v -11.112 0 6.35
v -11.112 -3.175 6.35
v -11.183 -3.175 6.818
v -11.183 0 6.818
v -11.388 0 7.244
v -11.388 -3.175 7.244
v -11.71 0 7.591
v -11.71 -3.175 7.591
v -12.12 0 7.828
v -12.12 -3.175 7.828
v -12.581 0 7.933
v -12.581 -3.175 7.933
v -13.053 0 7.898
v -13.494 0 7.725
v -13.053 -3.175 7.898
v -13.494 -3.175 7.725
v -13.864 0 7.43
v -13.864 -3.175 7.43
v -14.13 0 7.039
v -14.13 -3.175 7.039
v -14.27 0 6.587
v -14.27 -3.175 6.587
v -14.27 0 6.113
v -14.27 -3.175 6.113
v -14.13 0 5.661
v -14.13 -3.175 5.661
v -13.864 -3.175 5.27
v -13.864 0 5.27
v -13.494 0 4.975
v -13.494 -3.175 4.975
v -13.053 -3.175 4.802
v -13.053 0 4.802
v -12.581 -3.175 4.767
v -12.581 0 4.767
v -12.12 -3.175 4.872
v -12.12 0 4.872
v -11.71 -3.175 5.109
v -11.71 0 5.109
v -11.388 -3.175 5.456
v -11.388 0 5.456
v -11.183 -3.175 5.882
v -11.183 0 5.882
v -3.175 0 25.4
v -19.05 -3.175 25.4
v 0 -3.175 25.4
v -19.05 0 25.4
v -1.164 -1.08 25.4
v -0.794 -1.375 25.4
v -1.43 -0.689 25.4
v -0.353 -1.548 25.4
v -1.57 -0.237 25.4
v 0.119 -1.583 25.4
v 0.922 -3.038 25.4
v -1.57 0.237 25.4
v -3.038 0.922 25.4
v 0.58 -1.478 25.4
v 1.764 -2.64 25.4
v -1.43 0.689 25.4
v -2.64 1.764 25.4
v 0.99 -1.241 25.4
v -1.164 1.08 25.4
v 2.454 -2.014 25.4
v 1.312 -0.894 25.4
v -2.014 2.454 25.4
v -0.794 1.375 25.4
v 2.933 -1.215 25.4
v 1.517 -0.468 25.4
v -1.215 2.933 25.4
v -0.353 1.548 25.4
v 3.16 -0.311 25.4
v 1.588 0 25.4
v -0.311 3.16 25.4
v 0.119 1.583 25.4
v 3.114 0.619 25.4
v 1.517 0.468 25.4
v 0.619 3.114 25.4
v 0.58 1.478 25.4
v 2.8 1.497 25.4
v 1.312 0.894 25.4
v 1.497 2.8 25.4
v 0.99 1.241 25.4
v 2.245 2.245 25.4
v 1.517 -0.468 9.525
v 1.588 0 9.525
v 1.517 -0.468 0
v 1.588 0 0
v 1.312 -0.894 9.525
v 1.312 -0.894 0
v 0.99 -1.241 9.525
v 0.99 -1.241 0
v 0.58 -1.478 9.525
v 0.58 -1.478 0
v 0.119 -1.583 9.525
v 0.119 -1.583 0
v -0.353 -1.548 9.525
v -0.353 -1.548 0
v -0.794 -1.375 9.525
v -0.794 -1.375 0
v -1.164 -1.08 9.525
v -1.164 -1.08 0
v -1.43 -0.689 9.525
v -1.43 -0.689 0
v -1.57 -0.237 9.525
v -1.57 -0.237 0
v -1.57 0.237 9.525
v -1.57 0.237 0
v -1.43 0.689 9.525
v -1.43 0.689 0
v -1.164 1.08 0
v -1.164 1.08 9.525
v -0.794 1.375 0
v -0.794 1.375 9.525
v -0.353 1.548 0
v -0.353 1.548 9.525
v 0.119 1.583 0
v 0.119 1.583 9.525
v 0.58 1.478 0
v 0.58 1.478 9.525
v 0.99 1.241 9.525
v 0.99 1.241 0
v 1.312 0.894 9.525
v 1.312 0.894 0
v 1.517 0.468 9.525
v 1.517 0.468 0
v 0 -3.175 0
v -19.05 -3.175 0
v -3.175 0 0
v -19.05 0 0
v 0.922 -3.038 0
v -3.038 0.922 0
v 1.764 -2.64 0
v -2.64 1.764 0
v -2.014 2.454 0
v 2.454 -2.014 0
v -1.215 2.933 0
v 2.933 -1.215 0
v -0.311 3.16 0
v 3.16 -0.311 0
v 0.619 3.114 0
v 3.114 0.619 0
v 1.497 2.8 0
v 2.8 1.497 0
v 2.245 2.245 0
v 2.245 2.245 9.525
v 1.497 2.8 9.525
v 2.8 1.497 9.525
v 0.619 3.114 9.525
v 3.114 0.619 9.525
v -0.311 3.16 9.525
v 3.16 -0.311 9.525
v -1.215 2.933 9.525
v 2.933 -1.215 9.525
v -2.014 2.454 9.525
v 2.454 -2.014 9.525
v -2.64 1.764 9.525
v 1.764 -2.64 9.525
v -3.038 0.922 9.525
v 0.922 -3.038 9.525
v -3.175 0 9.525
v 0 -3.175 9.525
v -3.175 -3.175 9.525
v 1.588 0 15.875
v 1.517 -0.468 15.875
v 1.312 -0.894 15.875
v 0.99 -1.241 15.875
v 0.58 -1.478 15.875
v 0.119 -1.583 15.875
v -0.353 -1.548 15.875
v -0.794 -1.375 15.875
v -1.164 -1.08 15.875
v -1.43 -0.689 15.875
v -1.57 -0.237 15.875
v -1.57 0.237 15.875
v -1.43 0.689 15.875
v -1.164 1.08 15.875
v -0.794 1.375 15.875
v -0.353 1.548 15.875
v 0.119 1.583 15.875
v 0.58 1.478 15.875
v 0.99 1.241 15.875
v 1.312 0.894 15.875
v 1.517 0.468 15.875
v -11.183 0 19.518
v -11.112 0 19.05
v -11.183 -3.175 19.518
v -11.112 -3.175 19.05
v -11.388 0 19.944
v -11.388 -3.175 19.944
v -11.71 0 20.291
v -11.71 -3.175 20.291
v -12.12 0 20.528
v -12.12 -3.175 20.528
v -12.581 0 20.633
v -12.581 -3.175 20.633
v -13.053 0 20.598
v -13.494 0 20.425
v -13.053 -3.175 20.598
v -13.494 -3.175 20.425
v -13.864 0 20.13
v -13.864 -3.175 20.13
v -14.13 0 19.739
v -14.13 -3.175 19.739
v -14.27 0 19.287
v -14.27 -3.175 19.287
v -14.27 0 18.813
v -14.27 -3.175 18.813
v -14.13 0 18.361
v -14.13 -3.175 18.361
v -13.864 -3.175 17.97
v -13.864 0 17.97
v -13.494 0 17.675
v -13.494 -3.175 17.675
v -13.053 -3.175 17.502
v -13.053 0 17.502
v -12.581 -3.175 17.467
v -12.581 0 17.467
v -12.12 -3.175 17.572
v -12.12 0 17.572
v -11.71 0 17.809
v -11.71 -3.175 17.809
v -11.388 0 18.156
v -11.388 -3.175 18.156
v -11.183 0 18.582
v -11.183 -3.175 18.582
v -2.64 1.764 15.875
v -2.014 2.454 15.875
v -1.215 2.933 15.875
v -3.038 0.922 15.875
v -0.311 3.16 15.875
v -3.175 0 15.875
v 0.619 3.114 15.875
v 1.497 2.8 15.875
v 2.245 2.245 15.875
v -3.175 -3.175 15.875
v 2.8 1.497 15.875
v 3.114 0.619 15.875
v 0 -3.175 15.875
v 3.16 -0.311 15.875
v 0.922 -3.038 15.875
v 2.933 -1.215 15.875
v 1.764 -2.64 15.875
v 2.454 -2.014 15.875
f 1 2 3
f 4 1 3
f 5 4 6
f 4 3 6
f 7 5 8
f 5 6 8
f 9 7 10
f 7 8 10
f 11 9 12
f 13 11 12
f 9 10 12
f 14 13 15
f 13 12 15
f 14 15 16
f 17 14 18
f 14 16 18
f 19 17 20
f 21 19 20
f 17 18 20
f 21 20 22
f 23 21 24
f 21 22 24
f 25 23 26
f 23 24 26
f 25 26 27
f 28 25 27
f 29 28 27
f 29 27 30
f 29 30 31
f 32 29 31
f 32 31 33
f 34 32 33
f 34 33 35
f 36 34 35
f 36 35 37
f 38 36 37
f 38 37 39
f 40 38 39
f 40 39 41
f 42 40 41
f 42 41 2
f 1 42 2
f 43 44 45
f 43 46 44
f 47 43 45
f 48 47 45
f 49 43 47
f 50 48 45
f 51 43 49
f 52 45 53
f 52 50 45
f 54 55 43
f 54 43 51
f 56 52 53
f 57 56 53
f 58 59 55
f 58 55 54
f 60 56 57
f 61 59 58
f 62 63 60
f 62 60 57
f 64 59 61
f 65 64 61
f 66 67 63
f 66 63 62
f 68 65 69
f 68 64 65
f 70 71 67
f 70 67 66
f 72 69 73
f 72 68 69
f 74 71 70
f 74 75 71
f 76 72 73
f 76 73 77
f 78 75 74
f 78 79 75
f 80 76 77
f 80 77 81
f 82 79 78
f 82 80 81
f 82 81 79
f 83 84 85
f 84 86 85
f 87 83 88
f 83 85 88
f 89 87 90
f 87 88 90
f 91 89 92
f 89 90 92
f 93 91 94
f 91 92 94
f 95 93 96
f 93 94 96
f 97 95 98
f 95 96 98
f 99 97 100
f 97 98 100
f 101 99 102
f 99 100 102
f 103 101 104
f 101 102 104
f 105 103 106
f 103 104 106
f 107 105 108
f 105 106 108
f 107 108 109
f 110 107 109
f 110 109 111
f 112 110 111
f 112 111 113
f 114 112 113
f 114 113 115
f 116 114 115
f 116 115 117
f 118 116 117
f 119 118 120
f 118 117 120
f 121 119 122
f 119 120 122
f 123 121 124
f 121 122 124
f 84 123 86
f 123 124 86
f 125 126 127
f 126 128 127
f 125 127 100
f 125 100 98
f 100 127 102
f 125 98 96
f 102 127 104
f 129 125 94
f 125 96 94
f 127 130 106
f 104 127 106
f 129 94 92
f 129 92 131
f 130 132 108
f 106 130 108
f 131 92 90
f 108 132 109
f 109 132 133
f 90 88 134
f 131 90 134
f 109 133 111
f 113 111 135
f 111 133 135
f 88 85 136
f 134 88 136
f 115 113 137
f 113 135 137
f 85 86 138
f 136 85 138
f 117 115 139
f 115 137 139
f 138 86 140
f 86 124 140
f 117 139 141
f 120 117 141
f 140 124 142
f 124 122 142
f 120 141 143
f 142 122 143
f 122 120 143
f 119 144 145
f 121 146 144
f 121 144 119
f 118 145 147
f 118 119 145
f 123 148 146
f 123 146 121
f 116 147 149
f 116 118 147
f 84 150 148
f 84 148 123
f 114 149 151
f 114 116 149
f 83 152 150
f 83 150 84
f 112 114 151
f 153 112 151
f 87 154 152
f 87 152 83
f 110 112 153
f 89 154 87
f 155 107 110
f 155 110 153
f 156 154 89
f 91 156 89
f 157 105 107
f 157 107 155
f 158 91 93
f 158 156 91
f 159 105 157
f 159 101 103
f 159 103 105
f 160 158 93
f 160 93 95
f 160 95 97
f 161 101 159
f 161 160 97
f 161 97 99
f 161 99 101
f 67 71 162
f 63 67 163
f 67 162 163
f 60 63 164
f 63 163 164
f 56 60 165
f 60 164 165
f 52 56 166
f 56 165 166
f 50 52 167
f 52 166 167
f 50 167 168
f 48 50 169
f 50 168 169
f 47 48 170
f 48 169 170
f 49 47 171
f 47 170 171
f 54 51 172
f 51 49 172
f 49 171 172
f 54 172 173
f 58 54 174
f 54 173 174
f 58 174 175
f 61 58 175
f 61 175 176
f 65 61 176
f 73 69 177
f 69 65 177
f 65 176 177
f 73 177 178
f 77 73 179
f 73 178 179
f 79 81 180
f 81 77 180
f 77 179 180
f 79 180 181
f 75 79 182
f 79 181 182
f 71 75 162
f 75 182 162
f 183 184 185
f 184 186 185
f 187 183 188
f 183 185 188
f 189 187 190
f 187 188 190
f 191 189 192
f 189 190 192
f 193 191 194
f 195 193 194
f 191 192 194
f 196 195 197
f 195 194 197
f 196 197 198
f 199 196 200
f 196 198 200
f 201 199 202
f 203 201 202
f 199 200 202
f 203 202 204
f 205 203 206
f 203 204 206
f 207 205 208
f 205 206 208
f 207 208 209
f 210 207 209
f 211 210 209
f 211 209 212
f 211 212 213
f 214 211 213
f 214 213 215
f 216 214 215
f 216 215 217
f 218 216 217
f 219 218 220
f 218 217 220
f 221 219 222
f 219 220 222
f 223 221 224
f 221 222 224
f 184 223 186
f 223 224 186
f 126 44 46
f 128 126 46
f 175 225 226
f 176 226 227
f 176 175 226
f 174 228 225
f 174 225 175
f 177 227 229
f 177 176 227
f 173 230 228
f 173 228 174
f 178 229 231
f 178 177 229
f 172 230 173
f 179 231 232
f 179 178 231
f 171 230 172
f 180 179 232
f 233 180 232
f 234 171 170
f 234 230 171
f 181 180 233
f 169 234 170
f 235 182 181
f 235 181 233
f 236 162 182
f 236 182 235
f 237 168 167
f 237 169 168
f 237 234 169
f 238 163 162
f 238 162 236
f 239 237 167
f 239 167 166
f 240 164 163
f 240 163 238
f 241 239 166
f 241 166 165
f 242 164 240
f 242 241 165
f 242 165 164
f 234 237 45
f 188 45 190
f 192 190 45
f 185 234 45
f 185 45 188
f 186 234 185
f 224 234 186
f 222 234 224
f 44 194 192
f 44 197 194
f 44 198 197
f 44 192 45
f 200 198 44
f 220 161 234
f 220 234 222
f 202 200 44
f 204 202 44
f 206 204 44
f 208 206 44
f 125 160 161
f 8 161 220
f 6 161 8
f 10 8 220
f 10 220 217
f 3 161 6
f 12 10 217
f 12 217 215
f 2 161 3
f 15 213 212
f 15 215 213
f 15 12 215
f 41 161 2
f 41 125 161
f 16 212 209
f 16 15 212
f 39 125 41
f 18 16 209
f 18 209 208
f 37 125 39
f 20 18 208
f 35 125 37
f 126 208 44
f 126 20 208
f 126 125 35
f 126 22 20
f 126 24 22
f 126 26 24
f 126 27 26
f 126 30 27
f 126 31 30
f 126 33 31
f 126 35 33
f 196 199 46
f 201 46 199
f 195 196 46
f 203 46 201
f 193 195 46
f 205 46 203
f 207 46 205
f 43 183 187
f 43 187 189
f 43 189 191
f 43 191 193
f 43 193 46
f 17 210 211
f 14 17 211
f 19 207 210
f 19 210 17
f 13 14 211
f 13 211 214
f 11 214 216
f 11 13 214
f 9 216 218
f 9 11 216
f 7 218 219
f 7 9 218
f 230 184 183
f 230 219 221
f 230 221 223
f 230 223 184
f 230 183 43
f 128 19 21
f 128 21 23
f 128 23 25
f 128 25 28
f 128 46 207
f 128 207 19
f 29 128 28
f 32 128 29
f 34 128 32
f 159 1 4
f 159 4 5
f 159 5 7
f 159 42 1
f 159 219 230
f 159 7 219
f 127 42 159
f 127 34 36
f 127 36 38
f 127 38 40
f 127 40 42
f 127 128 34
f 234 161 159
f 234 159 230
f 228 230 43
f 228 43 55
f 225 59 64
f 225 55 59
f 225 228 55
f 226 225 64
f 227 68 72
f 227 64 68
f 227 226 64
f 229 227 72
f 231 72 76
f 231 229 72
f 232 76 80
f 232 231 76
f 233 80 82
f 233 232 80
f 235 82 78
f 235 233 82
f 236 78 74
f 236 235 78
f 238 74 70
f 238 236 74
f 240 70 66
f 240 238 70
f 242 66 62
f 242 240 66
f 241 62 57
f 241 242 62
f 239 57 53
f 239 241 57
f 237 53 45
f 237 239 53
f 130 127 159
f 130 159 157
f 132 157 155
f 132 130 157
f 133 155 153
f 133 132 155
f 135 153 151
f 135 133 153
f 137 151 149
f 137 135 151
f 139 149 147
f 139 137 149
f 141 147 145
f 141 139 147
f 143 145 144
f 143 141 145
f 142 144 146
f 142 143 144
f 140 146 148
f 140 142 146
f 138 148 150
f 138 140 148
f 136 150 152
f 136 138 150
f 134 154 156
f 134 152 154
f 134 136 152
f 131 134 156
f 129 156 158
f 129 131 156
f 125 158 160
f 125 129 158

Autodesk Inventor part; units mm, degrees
ref_plane "YZ Plane" through (0, 0, 0) normal (1, 0, 0) x (0, 1, 0)
ref_plane "XZ Plane" through (0, 0, 0) normal (0, 1, 0) x (-1, 0, 0)
ref_plane "XY Plane" through (0, 0, 0) normal (0, 0, 1) x (1, 0, 0)
sketch "Sketch1" plane through (0, 0, 0) normal (0, 0, 1) x (1, 0, 0)
  circle A0 centre (0, 0) radius 3.175
  circle A1 centre (0, 0) radius 1.5875
  line L0 (0, -3.175) -> (-19.05, -3.175)
  line L1 (-19.05, -3.175) -> (-19.05, 0)
  line L2 (-19.05, 0) -> (-1.5875, 0)
  line L3 (0, -1.5875) -> (0, -3.175)
  dimension "d0" = 6.35
  dimension "d1" = 3.175
  dimension "d2" = 19.05
  dimension "d3" = 3.175
extrude "Extrusion1" add sketch "Sketch1" along normal blind 25.4 contours L3 A1 L2 A0 | L0 L1 L2 A0 | A0 L2 A1 L3
sketch "Sketch2" plane through (-19.05, -3.175, 0) normal (0, -1, 0) x (1, 0, 0)
  line L0 (15.875, 15.875) -> (22.225, 15.875)
  line L1 (22.225, 15.875) -> (22.225, 9.525)
  line L2 (22.225, 9.525) -> (15.875, 9.525)
  line L3 (15.875, 9.525) -> (15.875, 15.875)
  line L4 (15.875, 25.4) -> (22.225, 25.4) projected
  circle A0 centre (6.35, 19.05) radius 1.5875
  circle A1 centre (6.35, 6.35) radius 1.5875
  point P0 (19.05, 0)
  point P1 (0, 25.4)
  point P2 (0, 0)
  dimension "d6" = 6.35
  dimension "d7" = 3.175
  dimension "d8" = 6.35
  dimension "d9" = 9.525
  dimension "d12" = 12.7
  dimension "d13" = 6.35
  dimension "d14" = 3.175
  dimension "d15" = 3.175
  dimension "d16" = 6.35
extrude "Extrusion2" cut sketch "Sketch2" against normal blind 25.4
properties part number "hinge two prong"
